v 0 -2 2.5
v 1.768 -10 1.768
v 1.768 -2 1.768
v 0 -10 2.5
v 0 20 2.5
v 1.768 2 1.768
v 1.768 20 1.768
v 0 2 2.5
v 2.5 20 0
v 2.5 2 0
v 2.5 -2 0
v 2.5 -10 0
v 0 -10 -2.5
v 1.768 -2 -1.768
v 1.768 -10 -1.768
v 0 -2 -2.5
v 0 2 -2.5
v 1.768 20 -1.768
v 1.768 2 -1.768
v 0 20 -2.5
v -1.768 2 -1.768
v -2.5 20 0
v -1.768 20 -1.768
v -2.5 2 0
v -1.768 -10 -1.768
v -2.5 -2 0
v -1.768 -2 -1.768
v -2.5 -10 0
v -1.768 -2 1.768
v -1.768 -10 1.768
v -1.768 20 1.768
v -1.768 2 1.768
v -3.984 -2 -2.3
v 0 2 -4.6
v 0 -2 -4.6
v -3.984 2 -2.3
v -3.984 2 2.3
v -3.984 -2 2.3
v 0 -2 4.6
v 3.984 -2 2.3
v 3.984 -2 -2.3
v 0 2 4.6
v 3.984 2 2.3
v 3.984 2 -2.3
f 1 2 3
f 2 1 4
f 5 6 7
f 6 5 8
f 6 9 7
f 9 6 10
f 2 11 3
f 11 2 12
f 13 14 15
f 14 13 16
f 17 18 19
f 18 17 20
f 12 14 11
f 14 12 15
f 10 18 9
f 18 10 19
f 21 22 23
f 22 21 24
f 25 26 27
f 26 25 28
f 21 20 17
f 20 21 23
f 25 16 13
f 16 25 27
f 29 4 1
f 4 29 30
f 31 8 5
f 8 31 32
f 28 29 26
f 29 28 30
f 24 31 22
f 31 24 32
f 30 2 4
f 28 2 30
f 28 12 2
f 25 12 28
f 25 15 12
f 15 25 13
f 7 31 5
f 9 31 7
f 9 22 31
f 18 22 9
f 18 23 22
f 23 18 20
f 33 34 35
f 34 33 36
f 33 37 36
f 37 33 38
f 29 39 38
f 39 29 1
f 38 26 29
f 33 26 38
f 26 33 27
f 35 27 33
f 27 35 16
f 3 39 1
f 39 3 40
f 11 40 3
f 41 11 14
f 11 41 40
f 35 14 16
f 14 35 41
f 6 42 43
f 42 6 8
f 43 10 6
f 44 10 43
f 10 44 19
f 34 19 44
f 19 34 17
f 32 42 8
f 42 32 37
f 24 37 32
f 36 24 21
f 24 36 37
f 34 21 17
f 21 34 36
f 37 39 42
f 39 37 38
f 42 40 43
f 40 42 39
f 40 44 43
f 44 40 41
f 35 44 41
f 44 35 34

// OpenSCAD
use <MCAD/regular_shapes.scad>

module m5_nut_mount(depth) {
	bolt_len = 20;
	nut_depth = 4;
	nut_radius=4.6;
	union() {
		// Cylinder for M5 bolt to pass through
		translate([0,(bolt_len-depth)/2,0]) rotate([90,0,0])
			cylinder(r=2.5,h=bolt_len+depth,center=true);
		// Position of nut
		translate([0,nut_depth/2,0]) rotate([90,90,0])
		hexagon_prism(height=4,radius=nut_radius);
	}
}

m5_nut_mount(10);
